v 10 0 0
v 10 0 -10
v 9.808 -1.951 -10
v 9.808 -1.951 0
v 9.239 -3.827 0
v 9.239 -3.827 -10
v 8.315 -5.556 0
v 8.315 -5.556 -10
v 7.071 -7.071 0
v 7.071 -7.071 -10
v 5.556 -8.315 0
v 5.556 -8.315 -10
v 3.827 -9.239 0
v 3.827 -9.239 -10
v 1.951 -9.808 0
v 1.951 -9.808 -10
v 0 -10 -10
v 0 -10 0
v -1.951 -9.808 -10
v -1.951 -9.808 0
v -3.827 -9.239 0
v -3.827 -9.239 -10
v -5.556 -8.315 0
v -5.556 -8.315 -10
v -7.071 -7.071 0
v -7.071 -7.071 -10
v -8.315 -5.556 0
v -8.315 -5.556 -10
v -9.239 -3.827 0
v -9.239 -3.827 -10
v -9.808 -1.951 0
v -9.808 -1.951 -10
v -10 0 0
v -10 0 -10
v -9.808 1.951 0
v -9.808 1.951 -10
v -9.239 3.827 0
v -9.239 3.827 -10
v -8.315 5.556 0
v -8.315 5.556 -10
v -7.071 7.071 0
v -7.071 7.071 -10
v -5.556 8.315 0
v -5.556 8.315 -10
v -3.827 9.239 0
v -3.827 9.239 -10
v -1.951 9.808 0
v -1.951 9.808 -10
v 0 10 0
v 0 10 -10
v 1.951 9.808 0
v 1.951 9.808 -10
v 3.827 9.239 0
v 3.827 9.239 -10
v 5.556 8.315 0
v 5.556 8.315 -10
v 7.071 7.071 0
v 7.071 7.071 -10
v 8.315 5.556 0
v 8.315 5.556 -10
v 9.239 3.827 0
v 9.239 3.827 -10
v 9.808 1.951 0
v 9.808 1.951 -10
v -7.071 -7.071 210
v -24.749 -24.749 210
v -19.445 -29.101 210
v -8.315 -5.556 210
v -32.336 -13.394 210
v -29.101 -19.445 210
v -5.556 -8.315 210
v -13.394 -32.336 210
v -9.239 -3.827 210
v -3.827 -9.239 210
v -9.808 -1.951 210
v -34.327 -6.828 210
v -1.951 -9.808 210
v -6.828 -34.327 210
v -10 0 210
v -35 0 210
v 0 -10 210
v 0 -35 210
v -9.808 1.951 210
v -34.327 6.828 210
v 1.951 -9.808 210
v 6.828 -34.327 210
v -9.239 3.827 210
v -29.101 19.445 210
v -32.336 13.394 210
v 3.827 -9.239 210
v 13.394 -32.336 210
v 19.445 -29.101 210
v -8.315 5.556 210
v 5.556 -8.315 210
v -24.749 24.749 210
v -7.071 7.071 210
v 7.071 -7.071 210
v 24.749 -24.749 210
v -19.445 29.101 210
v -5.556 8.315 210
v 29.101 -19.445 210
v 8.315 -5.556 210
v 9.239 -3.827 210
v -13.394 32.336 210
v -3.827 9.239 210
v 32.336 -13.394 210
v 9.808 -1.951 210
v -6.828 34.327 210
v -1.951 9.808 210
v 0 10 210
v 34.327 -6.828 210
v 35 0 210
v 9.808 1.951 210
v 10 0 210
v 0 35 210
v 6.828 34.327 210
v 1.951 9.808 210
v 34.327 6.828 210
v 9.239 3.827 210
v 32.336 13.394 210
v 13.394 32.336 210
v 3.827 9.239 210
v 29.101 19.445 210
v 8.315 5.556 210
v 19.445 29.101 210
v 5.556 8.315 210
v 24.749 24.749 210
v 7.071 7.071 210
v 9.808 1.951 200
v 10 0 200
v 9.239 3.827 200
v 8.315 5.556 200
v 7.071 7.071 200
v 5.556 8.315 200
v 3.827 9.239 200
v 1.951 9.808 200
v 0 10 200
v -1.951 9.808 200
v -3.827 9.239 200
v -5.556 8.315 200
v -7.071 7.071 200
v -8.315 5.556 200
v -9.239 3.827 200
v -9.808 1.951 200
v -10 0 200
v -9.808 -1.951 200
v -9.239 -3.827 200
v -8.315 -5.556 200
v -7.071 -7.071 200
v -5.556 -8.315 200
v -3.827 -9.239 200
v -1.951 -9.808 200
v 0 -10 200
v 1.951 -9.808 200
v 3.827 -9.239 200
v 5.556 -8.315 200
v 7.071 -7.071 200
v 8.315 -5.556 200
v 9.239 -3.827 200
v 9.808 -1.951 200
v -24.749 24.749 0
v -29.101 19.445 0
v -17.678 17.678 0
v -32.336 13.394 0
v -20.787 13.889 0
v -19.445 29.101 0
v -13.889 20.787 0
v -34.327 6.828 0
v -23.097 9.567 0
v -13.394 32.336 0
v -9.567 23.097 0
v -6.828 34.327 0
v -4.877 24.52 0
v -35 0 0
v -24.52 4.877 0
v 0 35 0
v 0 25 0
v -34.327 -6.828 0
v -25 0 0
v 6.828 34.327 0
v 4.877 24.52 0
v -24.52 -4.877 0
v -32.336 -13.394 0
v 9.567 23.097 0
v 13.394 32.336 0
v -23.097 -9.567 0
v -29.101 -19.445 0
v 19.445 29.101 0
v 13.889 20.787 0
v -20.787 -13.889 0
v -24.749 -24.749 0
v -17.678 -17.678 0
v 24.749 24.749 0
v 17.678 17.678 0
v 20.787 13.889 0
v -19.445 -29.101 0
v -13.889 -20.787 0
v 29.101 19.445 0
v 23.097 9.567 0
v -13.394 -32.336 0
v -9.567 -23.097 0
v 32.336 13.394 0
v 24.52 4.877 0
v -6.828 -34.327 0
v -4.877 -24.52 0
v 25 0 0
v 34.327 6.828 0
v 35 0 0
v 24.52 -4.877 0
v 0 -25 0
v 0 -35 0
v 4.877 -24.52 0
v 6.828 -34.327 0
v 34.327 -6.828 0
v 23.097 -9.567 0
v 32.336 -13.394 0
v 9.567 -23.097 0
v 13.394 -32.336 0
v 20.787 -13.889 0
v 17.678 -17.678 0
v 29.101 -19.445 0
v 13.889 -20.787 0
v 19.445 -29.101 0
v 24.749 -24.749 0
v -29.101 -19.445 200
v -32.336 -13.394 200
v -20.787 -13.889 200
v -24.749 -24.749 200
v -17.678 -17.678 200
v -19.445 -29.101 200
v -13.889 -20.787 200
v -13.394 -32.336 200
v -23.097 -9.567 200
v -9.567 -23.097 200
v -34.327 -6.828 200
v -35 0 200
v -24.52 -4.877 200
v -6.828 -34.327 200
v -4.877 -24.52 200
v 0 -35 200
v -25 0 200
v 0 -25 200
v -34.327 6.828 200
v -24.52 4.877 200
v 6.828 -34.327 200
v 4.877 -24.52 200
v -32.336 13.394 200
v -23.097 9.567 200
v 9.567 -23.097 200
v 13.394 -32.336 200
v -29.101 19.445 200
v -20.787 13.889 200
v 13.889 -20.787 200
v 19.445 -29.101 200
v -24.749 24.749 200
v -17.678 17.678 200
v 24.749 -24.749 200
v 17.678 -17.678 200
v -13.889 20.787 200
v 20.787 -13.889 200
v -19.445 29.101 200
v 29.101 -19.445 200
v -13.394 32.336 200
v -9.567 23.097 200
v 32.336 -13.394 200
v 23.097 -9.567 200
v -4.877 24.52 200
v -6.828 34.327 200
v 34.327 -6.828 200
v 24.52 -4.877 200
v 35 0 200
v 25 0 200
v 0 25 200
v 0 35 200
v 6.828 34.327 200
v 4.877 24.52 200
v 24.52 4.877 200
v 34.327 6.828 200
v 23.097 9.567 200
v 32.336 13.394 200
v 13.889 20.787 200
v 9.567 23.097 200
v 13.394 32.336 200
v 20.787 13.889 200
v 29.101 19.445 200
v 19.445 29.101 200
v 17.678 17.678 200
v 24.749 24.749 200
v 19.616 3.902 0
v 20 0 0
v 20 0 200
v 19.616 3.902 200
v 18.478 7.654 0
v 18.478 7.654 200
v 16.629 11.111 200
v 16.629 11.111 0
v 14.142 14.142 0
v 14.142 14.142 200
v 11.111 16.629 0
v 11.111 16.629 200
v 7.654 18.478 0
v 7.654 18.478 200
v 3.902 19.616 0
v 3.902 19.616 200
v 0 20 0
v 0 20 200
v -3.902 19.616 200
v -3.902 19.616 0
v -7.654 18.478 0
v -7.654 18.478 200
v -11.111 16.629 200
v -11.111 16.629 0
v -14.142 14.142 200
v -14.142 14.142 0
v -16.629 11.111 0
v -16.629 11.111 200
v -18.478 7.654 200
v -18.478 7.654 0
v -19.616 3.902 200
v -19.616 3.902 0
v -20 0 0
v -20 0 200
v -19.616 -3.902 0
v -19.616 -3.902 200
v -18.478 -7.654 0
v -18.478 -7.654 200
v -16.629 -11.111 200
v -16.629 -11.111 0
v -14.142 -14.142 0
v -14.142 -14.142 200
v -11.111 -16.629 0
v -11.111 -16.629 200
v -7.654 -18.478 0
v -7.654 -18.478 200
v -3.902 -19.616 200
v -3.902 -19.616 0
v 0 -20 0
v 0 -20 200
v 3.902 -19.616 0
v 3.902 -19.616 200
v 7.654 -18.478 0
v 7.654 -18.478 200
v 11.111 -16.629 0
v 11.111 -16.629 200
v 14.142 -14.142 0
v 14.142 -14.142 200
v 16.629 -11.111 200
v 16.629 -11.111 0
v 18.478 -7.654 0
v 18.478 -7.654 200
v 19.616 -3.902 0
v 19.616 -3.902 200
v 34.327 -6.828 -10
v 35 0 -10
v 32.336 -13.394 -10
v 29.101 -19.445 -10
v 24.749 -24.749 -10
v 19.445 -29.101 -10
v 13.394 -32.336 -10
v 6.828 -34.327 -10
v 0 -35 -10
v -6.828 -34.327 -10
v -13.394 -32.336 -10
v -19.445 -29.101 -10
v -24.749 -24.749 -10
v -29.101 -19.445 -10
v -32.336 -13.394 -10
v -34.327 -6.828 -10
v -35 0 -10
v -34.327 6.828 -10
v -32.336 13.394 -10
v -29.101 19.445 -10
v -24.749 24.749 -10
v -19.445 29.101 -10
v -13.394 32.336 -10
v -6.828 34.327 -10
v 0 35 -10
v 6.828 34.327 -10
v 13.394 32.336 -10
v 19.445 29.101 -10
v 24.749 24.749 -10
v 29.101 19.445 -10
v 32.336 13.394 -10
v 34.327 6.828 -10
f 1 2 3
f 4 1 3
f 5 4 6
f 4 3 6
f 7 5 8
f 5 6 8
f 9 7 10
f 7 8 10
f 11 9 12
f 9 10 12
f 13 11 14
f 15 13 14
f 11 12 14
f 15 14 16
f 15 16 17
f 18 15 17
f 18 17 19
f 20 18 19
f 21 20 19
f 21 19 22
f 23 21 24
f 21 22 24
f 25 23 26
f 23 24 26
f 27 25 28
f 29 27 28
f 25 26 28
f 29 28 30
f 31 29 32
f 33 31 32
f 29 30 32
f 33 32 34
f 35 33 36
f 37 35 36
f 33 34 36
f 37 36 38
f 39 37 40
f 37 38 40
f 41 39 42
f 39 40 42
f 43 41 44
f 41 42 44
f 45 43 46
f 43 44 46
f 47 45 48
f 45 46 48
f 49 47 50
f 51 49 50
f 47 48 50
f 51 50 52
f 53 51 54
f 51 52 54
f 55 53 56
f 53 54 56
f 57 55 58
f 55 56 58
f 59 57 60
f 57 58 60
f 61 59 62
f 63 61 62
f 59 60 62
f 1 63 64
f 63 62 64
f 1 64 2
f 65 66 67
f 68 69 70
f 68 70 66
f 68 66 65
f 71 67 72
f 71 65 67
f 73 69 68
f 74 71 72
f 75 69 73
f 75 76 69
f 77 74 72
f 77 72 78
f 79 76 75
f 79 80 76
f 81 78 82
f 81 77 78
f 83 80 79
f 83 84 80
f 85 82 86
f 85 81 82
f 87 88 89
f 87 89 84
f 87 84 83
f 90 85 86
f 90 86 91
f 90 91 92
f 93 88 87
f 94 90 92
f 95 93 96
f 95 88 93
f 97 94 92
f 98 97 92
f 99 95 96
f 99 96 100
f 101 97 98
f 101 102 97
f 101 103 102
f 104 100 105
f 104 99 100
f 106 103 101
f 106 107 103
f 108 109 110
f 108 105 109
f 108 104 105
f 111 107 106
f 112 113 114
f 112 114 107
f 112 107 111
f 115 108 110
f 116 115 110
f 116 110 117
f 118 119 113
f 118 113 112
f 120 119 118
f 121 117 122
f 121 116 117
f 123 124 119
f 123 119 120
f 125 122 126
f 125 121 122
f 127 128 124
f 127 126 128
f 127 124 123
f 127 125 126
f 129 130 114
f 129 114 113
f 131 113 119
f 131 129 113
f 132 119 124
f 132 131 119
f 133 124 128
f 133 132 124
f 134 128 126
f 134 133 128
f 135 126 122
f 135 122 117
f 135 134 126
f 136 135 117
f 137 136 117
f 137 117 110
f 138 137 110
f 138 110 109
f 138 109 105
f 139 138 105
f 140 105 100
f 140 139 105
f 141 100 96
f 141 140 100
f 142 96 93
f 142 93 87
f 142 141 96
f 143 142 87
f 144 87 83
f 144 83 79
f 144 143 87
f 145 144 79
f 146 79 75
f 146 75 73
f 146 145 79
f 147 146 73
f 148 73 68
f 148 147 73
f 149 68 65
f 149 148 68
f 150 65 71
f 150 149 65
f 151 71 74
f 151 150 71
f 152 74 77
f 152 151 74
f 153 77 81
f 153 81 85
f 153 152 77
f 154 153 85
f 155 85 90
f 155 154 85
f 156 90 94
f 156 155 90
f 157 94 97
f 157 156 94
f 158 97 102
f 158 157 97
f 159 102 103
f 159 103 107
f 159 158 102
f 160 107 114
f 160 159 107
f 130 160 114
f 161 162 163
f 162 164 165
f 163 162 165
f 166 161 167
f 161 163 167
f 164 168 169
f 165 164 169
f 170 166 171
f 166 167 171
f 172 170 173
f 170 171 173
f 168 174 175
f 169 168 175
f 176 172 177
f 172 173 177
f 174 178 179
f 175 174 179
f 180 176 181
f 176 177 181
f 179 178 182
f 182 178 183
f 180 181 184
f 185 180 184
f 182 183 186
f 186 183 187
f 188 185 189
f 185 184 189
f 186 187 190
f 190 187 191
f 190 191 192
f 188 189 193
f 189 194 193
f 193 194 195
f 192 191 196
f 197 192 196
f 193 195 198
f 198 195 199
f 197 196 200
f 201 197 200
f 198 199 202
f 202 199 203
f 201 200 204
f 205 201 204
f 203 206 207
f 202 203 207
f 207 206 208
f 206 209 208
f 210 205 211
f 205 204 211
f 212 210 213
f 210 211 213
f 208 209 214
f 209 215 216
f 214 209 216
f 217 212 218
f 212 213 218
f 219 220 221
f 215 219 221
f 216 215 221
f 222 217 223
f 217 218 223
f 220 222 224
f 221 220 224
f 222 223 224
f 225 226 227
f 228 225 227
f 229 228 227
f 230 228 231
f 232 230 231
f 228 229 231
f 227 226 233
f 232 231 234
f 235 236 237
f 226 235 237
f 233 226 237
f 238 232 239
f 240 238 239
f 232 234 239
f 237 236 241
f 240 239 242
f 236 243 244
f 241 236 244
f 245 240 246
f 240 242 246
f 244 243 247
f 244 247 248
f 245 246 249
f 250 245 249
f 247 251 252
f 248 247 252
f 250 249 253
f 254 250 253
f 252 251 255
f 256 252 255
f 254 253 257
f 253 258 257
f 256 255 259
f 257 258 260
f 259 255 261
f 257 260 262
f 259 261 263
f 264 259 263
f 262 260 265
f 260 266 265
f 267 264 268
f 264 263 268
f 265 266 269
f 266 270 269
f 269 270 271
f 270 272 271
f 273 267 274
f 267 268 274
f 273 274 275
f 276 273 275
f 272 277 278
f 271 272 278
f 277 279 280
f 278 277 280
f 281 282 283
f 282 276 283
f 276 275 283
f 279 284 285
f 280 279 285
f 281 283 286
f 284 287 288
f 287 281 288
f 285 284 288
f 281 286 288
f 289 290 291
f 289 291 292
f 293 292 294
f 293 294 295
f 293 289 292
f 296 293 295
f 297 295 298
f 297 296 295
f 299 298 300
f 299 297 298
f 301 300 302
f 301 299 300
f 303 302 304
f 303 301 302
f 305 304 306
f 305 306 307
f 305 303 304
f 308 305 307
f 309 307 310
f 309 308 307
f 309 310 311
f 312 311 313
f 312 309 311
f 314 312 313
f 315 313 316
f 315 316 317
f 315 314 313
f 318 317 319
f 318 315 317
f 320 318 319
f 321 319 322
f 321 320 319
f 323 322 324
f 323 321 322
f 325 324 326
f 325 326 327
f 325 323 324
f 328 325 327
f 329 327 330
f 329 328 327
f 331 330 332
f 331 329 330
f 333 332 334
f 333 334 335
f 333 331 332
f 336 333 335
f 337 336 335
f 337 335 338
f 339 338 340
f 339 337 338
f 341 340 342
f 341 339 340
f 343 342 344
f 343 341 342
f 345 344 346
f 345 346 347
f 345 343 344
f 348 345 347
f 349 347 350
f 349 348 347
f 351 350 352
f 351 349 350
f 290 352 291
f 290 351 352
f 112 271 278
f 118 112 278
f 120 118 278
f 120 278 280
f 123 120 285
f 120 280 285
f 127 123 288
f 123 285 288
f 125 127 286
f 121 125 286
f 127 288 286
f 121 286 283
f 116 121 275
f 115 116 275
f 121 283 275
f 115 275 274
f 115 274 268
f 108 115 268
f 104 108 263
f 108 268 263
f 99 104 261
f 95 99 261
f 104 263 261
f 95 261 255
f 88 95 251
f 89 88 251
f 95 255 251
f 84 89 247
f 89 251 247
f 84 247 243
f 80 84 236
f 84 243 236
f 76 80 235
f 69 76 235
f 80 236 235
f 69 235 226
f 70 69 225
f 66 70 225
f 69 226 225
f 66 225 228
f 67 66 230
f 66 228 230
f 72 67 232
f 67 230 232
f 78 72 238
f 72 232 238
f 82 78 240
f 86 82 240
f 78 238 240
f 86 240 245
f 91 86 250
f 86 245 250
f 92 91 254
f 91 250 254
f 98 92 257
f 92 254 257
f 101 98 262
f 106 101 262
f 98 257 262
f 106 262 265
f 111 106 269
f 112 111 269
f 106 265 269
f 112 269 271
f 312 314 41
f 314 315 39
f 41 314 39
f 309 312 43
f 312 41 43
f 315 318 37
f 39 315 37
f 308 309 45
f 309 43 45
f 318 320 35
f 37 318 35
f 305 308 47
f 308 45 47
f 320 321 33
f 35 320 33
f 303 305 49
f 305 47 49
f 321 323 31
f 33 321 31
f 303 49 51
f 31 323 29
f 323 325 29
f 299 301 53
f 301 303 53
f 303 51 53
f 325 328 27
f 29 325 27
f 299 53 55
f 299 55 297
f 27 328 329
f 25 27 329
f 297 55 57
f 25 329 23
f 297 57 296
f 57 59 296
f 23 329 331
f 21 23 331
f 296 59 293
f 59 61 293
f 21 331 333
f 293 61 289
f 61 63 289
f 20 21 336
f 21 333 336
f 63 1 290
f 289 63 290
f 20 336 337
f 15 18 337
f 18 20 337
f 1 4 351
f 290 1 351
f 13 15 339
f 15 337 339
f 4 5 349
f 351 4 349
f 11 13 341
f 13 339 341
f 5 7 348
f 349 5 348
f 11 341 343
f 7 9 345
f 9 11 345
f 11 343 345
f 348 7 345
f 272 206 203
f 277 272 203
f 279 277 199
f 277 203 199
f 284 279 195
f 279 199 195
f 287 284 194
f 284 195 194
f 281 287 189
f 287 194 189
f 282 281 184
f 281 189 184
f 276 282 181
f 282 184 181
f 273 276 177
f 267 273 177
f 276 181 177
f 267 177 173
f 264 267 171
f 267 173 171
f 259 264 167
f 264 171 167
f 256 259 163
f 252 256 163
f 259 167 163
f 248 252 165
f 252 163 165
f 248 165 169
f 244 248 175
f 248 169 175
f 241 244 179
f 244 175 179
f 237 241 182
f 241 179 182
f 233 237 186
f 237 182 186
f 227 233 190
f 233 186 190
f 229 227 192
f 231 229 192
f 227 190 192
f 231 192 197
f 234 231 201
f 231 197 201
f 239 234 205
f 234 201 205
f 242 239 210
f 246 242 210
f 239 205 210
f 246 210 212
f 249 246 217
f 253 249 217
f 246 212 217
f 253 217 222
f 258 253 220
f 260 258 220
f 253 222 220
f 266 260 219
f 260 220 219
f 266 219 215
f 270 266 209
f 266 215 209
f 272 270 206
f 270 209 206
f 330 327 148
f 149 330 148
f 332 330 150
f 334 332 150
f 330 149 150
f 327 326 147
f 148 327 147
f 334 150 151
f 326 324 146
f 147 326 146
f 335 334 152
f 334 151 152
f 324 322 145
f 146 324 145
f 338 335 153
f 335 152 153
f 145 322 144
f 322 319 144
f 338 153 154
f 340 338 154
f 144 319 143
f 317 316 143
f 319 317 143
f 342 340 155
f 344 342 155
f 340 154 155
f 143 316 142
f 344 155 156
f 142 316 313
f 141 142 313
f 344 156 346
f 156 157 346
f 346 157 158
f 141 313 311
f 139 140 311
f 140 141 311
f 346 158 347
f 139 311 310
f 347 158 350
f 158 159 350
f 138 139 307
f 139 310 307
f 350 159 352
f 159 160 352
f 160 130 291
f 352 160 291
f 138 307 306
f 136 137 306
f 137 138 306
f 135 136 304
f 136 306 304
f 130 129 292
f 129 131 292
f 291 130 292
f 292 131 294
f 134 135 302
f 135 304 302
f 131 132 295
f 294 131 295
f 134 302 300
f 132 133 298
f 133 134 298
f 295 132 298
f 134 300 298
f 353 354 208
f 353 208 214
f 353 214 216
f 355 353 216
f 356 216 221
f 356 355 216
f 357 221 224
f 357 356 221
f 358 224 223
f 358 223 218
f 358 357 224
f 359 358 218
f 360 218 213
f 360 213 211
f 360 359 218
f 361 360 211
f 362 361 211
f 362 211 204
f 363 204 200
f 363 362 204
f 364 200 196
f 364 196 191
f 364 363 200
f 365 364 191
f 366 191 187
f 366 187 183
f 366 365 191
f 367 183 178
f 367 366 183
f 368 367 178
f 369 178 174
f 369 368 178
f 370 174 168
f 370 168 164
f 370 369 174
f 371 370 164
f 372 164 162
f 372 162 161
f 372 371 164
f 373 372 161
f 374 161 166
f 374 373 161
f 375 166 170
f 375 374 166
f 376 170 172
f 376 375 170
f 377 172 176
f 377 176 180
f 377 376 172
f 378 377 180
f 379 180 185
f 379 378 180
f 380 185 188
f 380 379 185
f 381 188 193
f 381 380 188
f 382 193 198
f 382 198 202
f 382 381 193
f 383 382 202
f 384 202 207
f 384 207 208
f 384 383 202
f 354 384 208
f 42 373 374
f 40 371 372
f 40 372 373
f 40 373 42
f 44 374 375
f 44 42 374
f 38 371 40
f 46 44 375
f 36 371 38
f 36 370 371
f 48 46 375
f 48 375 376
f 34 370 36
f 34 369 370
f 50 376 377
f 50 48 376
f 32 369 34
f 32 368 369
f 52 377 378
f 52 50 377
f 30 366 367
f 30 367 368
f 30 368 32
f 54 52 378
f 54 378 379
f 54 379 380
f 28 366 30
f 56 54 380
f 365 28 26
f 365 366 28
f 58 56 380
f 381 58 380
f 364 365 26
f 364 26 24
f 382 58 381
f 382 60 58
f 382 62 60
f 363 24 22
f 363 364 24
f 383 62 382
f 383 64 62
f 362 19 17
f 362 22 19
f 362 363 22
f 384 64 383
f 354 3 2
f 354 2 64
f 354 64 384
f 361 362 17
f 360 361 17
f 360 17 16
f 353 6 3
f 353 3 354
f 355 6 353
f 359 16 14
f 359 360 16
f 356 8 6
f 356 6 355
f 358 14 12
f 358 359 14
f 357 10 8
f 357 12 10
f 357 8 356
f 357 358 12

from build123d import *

# Parameters (mm, degrees)
SKETCH1_R           = 25
SKETCH1_R_2         = 20
BOSS_EXTRUDE2_DEPTH = 200
SKETCH4_R           = 35
SKETCH4_R_2         = 10
BOSS_EXTRUDE3_DEPTH = 10
BOSS_EXTRUDE4_START = 10
SKETCH5_R           = 35
SKETCH5_R_2         = 10
BOSS_EXTRUDE4_DEPTH = 10


with BuildPart() as part:
    # Sketch1 → Boss-Extrude2 (new body)
    with BuildSketch(Plane.XY):
        Circle(SKETCH1_R)
        Circle(SKETCH1_R_2, mode=Mode.SUBTRACT)
    extrude(amount=BOSS_EXTRUDE2_DEPTH)

    # Sketch4 → Boss-Extrude3 (add)
    with BuildSketch(Plane.XY.offset(200)):
        Circle(SKETCH4_R)
        Circle(SKETCH4_R_2, mode=Mode.SUBTRACT)
    extrude(amount=BOSS_EXTRUDE3_DEPTH)

    # Sketch5 → Boss-Extrude4 (add)
    with BuildSketch(Plane(origin=(0, 0, 0), x_dir=(-1, 0, 0), z_dir=(0, 0, -1)).offset(BOSS_EXTRUDE4_START)):
        with Locations(Location((0, 0, 0), (0, 0, 180))):
            Circle(SKETCH5_R)
        with Locations(Location((0, 0, 0), (0, 0, 180))):
            Circle(SKETCH5_R_2, mode=Mode.SUBTRACT)
    extrude(amount=-BOSS_EXTRUDE4_DEPTH)


solid = part.part
